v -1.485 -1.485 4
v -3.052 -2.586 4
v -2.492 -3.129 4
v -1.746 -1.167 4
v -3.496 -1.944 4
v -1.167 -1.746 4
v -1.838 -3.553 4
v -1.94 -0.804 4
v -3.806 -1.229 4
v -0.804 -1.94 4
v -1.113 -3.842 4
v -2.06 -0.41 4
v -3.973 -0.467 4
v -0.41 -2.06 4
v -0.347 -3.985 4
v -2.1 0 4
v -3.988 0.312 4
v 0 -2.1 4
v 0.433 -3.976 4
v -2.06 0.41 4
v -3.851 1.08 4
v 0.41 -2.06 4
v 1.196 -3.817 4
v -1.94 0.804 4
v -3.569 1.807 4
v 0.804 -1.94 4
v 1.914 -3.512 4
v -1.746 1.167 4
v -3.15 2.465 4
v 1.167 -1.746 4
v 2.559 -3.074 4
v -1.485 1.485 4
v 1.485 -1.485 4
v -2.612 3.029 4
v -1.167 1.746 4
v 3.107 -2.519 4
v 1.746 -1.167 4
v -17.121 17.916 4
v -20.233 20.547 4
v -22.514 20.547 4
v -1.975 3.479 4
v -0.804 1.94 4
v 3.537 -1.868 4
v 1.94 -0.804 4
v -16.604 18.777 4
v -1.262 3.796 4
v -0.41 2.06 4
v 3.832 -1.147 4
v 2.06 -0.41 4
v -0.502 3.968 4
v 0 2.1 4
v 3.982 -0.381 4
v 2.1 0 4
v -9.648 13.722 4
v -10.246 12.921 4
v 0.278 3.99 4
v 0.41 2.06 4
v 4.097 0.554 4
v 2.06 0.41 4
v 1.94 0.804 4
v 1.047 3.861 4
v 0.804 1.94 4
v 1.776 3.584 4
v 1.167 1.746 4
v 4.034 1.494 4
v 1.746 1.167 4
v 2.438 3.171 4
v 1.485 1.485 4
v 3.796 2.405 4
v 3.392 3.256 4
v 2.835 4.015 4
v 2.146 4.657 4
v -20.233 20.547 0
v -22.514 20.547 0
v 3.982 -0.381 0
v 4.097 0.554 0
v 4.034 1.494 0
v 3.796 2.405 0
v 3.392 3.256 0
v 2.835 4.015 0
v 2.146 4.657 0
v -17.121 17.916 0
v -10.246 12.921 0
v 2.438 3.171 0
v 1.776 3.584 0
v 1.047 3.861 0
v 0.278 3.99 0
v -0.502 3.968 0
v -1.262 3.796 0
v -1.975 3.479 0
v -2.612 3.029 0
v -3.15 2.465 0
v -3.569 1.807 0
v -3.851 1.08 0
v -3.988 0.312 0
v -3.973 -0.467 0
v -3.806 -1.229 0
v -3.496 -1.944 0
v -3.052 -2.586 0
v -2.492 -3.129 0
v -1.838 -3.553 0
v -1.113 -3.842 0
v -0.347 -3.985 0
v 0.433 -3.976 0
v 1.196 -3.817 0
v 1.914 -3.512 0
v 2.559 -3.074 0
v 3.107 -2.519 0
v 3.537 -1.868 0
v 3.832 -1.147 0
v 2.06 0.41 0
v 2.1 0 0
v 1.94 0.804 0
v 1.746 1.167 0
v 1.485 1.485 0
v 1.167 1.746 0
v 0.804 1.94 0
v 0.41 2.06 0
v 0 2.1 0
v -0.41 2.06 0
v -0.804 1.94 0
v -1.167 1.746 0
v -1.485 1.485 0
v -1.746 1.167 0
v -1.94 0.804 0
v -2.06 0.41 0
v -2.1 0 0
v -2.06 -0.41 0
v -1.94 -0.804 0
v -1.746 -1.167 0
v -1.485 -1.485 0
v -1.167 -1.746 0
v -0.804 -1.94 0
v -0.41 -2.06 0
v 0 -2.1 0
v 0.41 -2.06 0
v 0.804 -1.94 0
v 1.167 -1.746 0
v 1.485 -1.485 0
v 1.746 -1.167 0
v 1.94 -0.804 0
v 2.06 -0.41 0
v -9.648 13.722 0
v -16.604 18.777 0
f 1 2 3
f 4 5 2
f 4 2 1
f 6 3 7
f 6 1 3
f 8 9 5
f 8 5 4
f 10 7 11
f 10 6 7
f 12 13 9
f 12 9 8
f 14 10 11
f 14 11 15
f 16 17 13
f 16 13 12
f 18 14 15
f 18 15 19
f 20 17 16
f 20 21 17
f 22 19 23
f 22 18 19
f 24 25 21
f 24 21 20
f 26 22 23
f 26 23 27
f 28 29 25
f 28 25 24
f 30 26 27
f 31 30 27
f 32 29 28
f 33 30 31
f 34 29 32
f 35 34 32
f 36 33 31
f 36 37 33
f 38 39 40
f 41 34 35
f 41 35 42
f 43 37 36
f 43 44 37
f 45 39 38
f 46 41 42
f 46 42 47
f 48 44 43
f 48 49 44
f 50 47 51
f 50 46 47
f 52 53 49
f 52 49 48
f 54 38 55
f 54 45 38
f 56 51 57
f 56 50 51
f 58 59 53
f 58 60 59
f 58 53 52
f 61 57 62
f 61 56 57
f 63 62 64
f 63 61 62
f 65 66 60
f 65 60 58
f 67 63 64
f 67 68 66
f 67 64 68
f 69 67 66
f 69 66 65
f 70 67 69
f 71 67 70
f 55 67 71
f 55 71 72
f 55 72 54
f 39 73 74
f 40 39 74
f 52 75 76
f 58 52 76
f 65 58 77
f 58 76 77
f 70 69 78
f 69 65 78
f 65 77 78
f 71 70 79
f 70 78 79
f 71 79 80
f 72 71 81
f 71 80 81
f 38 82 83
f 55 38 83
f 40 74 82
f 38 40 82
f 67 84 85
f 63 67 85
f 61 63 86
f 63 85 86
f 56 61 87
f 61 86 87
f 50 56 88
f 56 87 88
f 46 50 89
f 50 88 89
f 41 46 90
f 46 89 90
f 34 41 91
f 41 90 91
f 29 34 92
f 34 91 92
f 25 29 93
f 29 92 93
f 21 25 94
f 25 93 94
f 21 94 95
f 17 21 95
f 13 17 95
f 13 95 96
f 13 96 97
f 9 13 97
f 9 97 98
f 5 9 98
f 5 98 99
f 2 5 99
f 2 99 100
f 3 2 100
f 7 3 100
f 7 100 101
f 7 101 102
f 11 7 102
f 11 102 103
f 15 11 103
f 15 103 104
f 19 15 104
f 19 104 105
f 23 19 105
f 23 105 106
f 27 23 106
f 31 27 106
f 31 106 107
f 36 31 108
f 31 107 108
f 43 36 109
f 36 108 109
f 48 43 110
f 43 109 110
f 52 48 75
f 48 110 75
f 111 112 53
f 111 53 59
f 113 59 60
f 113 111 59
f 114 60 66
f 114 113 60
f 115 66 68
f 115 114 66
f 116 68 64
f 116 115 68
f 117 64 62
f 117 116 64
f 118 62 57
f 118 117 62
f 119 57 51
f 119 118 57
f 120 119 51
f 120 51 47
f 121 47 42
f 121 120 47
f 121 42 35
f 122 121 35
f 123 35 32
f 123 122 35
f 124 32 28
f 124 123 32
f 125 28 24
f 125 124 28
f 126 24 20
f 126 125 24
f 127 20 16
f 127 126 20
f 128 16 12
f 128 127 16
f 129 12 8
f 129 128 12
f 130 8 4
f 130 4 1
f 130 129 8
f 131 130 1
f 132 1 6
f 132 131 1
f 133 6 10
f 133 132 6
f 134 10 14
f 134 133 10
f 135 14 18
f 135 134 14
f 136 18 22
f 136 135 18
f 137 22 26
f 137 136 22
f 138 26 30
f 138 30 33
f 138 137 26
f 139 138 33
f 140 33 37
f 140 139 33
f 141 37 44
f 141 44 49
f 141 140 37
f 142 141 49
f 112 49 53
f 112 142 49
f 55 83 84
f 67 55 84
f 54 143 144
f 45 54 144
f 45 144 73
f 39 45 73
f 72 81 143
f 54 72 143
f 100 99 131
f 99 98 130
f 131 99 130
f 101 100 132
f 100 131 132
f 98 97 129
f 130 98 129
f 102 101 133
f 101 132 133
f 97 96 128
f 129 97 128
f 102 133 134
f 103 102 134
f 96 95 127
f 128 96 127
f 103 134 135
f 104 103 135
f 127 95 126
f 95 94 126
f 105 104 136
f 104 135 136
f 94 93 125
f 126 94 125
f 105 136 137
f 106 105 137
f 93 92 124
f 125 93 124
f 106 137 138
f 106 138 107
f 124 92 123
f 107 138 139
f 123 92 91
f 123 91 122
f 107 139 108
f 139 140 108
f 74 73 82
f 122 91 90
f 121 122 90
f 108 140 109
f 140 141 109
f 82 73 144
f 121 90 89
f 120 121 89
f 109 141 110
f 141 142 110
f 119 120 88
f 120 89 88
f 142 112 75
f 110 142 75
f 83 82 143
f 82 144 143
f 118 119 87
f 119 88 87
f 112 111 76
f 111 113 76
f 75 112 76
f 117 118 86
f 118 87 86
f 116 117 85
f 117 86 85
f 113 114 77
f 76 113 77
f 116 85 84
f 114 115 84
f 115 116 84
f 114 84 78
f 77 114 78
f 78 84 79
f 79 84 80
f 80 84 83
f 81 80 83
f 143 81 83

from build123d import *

# Parameters (mm, degrees)
CROQUIS1_R              = 4
CROQUIS1_R_2            = 2.1
SALIENTE_EXTRUIR1_DEPTH = 4
SALIENTE_EXTRUIR3_START = -4
SALIENTE_EXTRUIR3_DEPTH = 4
REDONDEO4_R             = 5


# Read off the part's stored shape, not the designer's step: Saliente-Extruir3
with BuildPart() as part:
    # Croquis1 → Saliente-Extruir1 (new body)
    with BuildSketch(Plane.XY):
        Circle(CROQUIS1_R)
        Circle(CROQUIS1_R_2, mode=Mode.SUBTRACT)
    extrude(amount=SALIENTE_EXTRUIR1_DEPTH)

    # Saliente-Extruir3 outline → Saliente-Extruir3 (add)
    with BuildSketch(Plane.XY.offset(4).offset(SALIENTE_EXTRUIR3_START)):
        with BuildLine():
            Line((3.981796419, -0.381178801), (6.969960414, 0.948790732))
            Line((6.969960414, 0.948790732), (-9.647602311, 13.722473625))
            Line((-9.647602311, 13.722473625), (-16.604293056, 18.776920888))
            Line((-16.604293056, 18.776920888), (-20.232922351, 20.546770492))
            Line((-20.232922351, 20.546770492), (-22.514043525, 20.546770492))
            Line((-22.514043525, 20.546770492), (-17.121307849, 17.916484969))
            Line((-17.121307849, 17.916484969), (-10.246328253, 12.921405689))
            Line((-10.246328253, 12.921405689), (2.437756913, 3.171331146))
            ThreePointArc((2.437756913, 3.171331146), (3.668480336, 1.594444112), (3.981796419, -0.381178801))
        make_face()
    extrude(amount=SALIENTE_EXTRUIR3_DEPTH)

    # Redondeo4
    # the kernel refuses this fillet: 5 mm, written as the material it takes off along each edge
    with BuildSketch(Plane(origin=(6.969960414, 0.948790732, -15.212006729), x_dir=(-0.9135962080773964, -0.4066226365890155, 0), z_dir=(0, 0, 1))) as redondeo4_piece_1:
        with BuildLine():
            CenterArc((7.295339023, -2.966960117), REDONDEO4_R, 143.601912221, 64.856271299)
            Line((2.899513394, -5.349546324), (2.811596881, -5.397198048))
            Line((2.811596881, -5.397198048), (-0.087916513, -0.047651724))
            Line((-0.087916513, -0.047651724), (0, 0.1))
            ThreePointArc((0, 0.1), (1.635385507, 0.1), (3.190279653, 0.059339202))
            Line((3.190279653, 0.059339202), (3.270771013, 0))
        make_face()
    extrude(amount=34.424013457, mode=Mode.SUBTRACT)


solid = part.part
